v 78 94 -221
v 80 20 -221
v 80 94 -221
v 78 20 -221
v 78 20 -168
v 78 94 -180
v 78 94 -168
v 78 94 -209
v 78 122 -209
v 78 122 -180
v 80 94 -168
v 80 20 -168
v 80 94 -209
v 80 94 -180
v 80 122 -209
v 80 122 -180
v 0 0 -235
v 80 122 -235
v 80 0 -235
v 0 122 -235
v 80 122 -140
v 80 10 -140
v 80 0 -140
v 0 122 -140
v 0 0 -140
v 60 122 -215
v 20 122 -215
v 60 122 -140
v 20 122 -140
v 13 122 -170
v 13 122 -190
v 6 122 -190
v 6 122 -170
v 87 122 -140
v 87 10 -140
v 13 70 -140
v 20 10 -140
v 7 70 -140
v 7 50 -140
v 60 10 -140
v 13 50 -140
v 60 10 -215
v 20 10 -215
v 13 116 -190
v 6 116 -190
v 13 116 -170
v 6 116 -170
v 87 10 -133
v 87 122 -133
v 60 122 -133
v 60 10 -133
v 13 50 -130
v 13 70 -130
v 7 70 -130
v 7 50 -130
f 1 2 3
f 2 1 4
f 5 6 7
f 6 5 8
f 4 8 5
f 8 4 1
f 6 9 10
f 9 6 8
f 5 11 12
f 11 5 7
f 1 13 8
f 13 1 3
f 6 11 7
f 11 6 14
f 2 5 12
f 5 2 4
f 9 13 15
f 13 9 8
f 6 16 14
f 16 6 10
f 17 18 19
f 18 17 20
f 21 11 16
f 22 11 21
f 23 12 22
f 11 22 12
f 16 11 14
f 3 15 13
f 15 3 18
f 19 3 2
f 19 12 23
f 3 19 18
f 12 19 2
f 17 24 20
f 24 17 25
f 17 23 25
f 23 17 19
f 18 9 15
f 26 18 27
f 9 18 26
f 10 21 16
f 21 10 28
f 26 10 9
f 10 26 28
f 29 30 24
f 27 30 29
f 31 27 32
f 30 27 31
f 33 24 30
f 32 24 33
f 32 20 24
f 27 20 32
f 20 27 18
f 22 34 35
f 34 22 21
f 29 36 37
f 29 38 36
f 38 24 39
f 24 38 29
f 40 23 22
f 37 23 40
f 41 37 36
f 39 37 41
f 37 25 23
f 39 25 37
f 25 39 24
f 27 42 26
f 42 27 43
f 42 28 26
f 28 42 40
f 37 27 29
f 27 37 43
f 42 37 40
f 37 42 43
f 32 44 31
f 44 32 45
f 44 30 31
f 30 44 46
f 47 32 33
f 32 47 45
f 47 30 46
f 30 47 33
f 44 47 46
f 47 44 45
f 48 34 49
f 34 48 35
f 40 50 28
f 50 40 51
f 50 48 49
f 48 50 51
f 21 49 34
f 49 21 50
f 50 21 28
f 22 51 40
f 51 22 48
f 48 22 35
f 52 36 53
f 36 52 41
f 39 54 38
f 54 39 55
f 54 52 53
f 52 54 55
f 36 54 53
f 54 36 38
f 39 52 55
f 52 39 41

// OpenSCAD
rotate(a=90,v=[0,1,0]) {
difference() {
    union() {
        difference() {
            cube([235,290,80]); // bottom
            
            union() {
                translate([168,20,78])
                cube([53,74,3]);    // nfc
                translate([180,94,78])
                cube([29,35,3]);    // nfc module
                translate([187,122,78])
                cube([14,20,3]);    // nfc line
                
                translate([50,-1,30])
                cube([57,11,5]);    // printer
            }
        }
        
        translate([0,60,80])
        rotate(a=90,v=[0,1,0]) {
            cylinder(r=60,h=140,$fn=50);    // front
        }
        
        difference() {
            translate([0,60,80])
            cube([140,65,60]);  // front2
        }
        
        difference() {
            translate([0,122,80])
            cube([235,168,60]); // back
            
            union() {
                translate([187,122,79])
                cube([14,20,6]);    // nfc line
                
                translate([21,140,138])
                cube([193,112,3]);  // lcd
                translate([35,144,134])
                cube([167,101,5]);  // lcd bottom
                translate([91,172,120])
                cube([65,56,15]);   // lcd module
                translate([97,140,130])
                cube([40,32,10]);    // lcd line
                
                translate([45,266,120])
                cube([145,10,21]);  // back lid
            }
        }
    }
    
    union() {
        translate([20,10,20])
        cube([195,260,40]); // inside bottom
        
        translate([20,10,60])
        cube([113,130,27]); // inside printer
        translate([20,140,60])
        cube([195,130,61]); // inside lcd
        
        translate([45,266,20])
        cube([145,25,101]); // inside back lid
        translate([45,266,10])
        cube([145,10,11]);  // inside bottom lid
        
        translate([-1,-1,-1])
        cube([141,292,142]);
        translate([140,122,-1])
        cube([96,169,142]);
        
        translate([170,116,6])
        cube([20,7,7]);
    }
}

translate([133,10,60])
cube([7,112,27]);   // 133+7,10+130,60+27

translate([130,50,7])
cube([11,20,6]);

}
